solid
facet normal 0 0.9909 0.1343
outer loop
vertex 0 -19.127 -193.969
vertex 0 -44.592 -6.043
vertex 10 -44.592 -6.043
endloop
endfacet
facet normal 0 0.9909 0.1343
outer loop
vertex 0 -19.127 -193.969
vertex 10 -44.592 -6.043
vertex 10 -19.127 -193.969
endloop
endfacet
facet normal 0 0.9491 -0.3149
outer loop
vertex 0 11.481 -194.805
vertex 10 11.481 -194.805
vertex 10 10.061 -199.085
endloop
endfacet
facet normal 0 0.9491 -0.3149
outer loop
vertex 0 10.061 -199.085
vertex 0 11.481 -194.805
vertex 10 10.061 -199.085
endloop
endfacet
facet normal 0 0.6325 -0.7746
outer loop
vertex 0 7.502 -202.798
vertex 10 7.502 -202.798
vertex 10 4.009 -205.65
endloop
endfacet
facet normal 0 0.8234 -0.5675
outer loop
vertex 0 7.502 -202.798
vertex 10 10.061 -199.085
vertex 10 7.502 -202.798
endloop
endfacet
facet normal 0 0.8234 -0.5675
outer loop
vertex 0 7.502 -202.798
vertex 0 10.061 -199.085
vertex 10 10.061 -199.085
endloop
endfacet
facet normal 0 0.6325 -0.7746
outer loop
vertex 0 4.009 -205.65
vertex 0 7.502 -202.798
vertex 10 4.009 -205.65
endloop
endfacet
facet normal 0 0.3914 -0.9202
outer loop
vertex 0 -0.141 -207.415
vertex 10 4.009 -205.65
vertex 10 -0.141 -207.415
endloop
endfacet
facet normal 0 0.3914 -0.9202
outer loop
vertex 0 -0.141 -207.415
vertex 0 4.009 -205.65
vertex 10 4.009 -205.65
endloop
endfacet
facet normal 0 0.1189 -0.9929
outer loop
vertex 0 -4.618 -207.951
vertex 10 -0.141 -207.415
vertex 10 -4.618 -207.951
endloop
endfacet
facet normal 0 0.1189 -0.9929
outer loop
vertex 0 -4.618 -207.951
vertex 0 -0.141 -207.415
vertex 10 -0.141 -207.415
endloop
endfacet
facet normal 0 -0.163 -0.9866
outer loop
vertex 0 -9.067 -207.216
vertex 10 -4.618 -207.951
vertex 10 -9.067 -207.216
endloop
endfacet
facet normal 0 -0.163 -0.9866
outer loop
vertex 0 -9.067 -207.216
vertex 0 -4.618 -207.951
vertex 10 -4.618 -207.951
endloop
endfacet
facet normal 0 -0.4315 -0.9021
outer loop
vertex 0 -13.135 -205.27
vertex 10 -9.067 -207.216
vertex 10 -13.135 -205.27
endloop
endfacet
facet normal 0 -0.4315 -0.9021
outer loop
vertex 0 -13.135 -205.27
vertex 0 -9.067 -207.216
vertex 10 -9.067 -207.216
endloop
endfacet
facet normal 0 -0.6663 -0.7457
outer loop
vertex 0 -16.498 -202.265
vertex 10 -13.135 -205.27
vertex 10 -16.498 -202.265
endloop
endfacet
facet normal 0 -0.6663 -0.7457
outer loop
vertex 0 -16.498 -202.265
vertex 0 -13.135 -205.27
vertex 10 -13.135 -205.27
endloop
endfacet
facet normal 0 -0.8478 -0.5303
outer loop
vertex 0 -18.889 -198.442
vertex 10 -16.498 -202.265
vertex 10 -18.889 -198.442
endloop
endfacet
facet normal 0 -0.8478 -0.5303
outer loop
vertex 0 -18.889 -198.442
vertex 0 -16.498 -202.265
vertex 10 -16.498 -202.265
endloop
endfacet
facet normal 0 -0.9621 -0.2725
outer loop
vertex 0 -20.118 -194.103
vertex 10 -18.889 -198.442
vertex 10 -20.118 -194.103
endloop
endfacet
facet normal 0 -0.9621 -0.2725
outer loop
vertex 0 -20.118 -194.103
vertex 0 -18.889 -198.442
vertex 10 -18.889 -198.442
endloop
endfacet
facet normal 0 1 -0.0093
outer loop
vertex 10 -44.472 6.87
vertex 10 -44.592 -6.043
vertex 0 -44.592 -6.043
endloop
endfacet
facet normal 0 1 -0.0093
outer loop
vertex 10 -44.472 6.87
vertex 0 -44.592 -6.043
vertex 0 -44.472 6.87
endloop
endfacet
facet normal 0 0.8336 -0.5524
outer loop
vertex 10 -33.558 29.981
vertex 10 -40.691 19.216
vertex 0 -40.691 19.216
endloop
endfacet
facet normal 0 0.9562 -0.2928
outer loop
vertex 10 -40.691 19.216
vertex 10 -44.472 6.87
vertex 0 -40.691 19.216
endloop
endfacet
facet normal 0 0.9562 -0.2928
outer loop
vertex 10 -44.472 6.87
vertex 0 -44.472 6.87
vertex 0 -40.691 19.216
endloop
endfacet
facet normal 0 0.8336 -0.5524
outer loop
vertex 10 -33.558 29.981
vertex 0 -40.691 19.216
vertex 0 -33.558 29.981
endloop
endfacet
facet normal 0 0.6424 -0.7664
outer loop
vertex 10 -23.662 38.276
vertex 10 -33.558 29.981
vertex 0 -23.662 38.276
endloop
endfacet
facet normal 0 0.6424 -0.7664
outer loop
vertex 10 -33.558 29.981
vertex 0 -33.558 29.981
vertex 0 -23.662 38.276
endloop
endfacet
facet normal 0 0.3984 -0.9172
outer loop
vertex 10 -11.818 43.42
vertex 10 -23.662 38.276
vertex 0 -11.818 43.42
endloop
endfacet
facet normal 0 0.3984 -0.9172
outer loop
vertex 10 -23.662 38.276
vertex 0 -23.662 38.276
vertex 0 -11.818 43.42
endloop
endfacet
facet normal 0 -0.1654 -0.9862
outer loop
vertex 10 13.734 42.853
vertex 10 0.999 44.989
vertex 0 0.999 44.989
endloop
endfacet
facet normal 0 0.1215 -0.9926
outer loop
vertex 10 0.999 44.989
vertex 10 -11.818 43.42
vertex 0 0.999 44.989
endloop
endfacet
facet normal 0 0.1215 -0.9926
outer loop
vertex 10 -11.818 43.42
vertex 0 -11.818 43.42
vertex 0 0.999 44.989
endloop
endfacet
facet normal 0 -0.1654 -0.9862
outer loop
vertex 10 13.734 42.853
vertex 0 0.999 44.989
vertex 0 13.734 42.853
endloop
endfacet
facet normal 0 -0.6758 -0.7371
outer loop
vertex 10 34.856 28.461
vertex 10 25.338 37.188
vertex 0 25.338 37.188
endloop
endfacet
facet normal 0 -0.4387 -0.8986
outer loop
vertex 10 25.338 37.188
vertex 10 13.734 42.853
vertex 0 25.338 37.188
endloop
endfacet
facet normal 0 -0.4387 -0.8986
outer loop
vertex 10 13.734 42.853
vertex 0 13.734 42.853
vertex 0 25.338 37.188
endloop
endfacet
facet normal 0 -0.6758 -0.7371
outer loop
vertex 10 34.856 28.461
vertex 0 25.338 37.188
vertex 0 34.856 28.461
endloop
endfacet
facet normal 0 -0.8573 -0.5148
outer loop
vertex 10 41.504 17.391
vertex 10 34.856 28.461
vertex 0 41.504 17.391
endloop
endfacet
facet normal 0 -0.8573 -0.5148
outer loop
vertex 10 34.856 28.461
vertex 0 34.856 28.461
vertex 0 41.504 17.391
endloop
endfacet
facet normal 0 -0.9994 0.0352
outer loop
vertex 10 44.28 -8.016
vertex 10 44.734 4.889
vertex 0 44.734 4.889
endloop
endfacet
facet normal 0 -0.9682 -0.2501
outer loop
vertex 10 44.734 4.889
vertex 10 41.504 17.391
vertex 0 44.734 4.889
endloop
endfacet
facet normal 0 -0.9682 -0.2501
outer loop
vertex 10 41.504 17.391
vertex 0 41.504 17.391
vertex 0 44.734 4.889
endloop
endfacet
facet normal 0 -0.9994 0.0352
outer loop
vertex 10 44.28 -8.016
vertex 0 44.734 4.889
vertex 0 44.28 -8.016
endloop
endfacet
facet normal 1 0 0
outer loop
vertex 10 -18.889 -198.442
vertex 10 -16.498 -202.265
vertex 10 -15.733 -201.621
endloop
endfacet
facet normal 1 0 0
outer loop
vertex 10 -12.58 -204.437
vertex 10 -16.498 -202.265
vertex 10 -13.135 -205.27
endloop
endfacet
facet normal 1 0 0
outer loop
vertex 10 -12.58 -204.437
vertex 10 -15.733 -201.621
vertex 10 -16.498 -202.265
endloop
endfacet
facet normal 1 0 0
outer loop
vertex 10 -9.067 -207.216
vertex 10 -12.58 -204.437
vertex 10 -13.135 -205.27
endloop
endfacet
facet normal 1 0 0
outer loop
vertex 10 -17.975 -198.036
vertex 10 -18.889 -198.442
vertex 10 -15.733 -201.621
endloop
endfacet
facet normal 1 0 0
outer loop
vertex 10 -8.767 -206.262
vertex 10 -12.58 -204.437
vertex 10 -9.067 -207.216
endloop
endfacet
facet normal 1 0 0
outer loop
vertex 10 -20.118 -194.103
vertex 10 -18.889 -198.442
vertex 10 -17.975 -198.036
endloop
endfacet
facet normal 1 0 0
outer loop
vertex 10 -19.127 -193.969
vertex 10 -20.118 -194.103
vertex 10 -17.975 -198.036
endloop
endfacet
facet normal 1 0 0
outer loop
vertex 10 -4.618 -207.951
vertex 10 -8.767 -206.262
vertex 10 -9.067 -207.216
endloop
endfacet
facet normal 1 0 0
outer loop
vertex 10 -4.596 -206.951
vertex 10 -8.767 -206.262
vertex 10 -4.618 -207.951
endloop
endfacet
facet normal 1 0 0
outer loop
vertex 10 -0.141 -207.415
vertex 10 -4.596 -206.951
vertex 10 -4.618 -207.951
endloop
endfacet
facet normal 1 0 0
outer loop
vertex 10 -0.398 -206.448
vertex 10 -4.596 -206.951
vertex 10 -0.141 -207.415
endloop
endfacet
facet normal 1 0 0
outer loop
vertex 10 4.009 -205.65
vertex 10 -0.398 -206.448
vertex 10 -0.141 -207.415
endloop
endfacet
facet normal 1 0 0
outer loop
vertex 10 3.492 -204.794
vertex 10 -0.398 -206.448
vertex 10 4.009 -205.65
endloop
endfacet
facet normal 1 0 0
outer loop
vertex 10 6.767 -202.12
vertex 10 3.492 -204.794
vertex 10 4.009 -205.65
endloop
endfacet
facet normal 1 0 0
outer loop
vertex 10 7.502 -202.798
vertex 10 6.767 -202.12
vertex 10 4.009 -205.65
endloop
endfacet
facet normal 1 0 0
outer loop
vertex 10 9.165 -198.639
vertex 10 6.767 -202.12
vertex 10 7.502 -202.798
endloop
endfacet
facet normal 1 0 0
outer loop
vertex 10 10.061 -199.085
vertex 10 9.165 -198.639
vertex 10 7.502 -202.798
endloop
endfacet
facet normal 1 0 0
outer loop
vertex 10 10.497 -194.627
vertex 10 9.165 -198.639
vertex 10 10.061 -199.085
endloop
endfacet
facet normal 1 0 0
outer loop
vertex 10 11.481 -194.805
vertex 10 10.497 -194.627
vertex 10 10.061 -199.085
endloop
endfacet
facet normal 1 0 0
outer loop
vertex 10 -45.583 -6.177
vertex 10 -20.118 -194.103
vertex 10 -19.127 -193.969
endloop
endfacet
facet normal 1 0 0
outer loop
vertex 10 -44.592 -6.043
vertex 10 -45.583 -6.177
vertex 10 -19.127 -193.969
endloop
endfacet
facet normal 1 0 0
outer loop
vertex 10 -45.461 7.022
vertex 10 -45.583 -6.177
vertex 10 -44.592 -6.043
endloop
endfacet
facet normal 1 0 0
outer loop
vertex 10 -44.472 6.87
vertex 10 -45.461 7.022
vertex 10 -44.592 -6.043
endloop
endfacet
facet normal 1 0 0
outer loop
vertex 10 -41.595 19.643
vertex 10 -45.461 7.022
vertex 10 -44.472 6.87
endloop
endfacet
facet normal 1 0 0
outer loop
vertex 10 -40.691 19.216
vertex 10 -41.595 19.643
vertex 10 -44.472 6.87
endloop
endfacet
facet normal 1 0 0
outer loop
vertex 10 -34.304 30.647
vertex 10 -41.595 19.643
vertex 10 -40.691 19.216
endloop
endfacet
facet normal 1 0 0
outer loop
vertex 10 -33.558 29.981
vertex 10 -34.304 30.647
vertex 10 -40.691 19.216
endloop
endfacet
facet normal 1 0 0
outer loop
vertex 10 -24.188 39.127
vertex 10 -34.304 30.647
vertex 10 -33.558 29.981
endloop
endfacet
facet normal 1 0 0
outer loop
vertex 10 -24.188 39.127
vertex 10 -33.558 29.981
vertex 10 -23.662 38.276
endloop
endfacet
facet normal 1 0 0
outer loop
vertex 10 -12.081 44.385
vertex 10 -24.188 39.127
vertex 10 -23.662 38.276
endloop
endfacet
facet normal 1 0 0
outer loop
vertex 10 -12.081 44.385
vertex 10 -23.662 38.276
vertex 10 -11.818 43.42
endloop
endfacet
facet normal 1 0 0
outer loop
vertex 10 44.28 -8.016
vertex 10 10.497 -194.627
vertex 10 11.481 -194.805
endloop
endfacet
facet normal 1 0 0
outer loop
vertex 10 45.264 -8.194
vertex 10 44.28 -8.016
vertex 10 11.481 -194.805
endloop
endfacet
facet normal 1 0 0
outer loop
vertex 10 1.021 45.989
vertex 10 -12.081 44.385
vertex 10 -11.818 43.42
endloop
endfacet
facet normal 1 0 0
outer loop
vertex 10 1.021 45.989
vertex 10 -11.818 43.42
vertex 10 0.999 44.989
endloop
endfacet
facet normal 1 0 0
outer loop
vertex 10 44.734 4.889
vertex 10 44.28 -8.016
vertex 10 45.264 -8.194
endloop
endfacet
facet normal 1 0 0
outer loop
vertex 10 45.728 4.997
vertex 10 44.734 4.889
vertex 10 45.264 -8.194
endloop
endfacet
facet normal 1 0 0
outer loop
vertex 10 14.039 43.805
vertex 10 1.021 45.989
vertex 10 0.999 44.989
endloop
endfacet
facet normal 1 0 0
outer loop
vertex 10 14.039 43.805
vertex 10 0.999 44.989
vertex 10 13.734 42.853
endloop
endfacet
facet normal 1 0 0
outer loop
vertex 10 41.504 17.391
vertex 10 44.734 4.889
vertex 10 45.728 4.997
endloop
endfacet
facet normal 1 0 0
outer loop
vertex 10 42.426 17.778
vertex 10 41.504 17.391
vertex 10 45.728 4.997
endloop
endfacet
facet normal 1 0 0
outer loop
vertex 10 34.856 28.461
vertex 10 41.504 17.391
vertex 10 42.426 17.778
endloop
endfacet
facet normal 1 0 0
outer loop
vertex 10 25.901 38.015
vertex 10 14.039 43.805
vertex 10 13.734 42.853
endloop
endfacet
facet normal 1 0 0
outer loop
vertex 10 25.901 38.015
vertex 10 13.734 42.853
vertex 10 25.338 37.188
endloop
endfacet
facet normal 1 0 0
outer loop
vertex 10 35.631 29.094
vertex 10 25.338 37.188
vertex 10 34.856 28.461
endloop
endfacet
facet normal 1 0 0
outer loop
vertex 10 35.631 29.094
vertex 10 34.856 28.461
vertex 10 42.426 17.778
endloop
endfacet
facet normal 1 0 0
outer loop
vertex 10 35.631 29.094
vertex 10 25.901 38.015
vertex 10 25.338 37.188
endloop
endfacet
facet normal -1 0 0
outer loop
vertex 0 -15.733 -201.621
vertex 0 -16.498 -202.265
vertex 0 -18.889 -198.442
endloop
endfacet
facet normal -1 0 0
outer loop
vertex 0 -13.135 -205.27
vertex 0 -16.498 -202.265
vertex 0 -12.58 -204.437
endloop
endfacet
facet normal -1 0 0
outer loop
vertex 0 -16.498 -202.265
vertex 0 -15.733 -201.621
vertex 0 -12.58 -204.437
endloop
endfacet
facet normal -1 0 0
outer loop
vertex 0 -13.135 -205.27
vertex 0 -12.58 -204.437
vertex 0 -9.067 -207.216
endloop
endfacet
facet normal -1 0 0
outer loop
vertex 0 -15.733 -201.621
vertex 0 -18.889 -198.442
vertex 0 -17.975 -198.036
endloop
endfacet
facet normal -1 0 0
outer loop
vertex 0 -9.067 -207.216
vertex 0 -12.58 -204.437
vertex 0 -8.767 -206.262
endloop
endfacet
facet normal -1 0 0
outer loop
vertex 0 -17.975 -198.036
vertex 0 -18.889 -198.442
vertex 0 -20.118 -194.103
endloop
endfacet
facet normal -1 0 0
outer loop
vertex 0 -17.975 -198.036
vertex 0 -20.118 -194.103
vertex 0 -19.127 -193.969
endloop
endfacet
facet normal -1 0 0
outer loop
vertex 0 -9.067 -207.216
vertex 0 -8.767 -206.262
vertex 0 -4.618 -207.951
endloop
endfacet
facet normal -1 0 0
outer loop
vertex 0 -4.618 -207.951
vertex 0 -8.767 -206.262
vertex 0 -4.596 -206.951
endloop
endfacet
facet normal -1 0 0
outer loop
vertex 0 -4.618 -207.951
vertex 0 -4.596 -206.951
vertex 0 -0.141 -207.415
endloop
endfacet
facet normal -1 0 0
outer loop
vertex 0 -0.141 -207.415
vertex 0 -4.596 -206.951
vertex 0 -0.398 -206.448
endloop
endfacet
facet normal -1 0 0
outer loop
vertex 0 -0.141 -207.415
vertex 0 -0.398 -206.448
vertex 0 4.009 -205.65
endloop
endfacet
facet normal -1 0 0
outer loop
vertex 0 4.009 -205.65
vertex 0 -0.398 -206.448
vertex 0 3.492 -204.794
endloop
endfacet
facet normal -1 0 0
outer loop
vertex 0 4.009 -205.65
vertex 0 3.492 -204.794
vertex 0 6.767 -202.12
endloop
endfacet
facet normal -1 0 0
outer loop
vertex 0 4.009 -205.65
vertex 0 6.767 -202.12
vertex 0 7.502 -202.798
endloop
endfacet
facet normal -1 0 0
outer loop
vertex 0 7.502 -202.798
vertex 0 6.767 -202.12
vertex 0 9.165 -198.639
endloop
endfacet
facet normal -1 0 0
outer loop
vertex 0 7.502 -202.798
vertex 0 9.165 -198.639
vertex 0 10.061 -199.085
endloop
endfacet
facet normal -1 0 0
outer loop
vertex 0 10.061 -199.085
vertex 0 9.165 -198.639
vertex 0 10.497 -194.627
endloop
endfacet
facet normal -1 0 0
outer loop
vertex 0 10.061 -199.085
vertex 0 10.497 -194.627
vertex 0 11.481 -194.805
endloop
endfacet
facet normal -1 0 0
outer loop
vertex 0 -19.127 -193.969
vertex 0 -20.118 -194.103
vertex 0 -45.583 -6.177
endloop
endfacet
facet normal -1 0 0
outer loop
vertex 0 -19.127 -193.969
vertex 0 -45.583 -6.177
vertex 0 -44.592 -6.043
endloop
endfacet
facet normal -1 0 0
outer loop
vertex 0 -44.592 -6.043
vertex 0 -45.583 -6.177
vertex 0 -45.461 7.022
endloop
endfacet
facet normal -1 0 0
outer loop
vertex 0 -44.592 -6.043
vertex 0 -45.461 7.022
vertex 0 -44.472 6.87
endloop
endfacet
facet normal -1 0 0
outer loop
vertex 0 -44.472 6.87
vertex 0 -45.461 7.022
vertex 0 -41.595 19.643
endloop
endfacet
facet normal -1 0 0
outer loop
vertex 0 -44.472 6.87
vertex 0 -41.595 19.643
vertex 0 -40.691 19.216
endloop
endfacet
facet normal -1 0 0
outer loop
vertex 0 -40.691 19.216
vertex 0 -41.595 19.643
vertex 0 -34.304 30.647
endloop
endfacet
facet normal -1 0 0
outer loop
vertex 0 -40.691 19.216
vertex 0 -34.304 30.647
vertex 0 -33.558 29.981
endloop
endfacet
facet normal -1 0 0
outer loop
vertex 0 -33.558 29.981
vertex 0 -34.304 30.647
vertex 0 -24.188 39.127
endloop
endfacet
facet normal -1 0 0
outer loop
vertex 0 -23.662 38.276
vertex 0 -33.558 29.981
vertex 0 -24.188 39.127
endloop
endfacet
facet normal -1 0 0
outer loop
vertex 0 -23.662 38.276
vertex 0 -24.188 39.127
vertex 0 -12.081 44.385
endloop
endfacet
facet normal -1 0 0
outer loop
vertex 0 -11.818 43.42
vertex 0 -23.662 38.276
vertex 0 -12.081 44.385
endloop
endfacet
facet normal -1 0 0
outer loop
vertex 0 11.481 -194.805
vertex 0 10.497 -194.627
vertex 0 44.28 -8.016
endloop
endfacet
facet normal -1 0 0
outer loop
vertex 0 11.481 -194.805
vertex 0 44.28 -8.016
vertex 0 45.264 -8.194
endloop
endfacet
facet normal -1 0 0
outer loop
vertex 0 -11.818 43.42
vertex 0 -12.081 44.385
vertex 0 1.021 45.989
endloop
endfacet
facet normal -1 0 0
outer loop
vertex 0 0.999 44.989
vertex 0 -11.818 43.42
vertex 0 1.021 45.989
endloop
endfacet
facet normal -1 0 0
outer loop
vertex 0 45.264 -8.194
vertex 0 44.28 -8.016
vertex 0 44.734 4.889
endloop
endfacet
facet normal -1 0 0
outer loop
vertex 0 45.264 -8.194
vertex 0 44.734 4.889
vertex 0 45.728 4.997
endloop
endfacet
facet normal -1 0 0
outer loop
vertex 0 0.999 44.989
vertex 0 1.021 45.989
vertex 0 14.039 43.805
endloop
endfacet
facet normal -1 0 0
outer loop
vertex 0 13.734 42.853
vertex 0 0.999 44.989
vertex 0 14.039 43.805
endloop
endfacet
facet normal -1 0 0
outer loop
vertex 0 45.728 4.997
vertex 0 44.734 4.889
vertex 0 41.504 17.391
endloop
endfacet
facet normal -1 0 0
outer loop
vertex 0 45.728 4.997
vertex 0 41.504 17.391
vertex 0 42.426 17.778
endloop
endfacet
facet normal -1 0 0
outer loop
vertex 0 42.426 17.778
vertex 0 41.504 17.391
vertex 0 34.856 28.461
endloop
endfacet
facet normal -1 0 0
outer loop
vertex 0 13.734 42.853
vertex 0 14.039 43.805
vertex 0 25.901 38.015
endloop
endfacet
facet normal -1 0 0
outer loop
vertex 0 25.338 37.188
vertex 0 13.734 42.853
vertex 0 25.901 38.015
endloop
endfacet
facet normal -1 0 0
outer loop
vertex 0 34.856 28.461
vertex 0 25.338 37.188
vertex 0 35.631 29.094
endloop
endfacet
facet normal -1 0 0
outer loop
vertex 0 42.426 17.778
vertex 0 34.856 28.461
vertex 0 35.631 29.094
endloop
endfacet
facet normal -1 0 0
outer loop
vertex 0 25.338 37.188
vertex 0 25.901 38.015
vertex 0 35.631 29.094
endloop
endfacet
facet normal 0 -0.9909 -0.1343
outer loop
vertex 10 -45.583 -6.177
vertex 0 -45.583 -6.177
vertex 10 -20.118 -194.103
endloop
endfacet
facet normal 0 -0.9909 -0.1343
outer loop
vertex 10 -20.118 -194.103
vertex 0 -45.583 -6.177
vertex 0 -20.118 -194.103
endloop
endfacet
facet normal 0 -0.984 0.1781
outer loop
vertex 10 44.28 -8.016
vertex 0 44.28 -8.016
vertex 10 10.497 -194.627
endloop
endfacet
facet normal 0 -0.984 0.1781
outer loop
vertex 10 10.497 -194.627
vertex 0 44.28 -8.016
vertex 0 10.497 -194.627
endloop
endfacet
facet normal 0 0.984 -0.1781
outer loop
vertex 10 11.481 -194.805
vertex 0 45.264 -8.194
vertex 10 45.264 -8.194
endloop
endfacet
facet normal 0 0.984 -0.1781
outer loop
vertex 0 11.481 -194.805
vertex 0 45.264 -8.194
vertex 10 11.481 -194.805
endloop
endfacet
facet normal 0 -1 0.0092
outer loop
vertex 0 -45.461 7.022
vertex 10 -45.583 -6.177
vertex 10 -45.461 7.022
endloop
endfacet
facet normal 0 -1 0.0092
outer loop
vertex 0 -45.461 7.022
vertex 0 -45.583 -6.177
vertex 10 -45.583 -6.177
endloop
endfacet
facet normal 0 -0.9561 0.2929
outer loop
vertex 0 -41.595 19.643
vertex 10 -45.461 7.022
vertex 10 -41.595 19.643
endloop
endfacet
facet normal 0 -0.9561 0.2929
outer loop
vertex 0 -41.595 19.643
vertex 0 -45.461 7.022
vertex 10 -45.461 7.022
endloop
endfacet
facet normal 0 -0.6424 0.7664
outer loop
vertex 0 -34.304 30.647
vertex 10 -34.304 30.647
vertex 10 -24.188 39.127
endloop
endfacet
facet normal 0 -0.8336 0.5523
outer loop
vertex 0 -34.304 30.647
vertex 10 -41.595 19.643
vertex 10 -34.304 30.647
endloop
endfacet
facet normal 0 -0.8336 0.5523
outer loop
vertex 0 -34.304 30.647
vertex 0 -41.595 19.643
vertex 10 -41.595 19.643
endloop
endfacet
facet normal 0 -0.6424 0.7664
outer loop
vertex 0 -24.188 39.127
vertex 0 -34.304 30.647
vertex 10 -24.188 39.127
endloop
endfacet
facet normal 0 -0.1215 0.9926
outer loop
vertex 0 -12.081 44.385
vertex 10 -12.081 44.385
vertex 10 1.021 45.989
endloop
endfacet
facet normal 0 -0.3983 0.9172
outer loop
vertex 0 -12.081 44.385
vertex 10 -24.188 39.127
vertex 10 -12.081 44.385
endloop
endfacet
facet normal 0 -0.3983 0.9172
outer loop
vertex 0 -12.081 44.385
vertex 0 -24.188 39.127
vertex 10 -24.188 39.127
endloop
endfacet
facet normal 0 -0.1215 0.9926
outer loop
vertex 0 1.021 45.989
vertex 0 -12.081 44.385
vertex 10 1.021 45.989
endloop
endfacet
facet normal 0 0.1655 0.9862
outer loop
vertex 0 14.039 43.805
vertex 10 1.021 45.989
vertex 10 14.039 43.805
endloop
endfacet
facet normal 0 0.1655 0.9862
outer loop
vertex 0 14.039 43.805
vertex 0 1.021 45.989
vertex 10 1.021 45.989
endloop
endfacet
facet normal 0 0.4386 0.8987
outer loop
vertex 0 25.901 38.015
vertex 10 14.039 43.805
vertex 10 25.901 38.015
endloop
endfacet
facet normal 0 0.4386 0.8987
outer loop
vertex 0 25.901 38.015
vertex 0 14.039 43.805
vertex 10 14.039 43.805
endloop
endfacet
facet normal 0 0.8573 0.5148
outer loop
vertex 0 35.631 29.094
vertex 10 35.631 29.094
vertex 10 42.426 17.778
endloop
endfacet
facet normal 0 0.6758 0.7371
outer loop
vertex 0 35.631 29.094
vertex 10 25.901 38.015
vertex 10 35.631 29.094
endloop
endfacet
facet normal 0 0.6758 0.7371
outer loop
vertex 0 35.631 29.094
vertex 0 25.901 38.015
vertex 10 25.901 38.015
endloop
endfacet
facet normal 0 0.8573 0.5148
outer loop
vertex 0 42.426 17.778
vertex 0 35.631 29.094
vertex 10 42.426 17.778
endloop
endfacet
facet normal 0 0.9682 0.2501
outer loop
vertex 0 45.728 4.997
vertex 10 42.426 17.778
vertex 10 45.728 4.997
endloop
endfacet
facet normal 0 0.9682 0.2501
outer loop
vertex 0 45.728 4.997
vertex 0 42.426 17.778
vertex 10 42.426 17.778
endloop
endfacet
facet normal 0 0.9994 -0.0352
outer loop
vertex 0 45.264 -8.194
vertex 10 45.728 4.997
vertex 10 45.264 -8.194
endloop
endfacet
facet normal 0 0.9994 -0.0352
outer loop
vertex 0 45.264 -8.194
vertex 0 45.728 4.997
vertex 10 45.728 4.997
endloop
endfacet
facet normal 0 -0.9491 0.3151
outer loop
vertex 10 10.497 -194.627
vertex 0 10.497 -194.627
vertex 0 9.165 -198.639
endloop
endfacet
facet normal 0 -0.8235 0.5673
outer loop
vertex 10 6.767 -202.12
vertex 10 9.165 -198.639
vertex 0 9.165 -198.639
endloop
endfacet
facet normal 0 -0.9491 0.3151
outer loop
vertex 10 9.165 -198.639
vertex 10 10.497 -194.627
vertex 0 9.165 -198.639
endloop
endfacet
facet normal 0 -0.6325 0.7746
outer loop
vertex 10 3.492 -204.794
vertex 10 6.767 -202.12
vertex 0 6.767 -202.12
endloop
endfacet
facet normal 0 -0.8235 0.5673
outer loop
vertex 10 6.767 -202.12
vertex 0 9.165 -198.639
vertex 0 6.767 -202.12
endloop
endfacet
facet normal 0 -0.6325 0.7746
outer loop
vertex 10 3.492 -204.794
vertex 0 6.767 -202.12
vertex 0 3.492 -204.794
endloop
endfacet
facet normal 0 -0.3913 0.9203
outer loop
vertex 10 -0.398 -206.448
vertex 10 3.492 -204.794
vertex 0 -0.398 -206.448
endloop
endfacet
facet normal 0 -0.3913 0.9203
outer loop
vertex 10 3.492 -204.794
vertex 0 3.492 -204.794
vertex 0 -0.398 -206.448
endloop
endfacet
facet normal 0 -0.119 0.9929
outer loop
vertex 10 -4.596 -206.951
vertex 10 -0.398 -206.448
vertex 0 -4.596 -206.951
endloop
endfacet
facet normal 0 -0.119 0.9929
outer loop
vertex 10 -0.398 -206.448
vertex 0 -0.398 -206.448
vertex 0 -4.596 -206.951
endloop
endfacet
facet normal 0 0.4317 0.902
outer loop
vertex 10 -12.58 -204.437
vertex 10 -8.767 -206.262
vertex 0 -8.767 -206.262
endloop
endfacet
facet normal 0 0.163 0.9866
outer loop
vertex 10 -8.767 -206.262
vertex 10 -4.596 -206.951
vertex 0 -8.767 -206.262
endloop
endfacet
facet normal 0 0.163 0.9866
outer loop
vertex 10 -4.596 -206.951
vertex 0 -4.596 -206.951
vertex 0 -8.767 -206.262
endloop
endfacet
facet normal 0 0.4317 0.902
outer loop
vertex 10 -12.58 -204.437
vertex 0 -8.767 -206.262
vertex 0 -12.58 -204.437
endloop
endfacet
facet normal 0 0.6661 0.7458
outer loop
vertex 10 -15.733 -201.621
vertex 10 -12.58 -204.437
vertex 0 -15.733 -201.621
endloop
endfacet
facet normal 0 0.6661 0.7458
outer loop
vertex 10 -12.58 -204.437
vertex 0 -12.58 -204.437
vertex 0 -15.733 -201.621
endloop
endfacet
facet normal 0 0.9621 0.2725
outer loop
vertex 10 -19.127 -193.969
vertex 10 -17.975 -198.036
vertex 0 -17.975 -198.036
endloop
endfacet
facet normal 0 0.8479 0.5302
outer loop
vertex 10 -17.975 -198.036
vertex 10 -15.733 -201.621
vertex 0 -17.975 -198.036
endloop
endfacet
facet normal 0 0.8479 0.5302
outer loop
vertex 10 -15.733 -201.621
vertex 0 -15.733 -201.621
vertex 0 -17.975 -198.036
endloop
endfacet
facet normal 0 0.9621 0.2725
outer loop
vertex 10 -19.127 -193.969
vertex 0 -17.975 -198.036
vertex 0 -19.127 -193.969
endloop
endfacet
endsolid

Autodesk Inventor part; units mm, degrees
ref_plane "YZ Plane" through (0, 0, 0) normal (1, 0, 0) x (0, 1, 0)
ref_plane "XZ Plane" through (0, 0, 0) normal (0, 1, 0) x (-1, 0, 0)
ref_plane "XY Plane" through (0, 0, 0) normal (0, 0, 1) x (1, 0, 0)
sketch "スケッチ1" plane through (0, 0, 0) normal (1, 0, 0) x (0, 1, 0)
  arc A0 (45.2642, -8.1944) -> (-45.5834, -6.1769) centre (0, 0) ccw
  arc A1 (-20.1179, -194.1032) -> (11.4813, -194.8049) centre (-4.2628, -191.9547) ccw
  line L0 (45.2642, -8.1944) -> (11.4813, -194.8049)
  line L1 (-45.5834, -6.1769) -> (-20.1179, -194.1032)
  arc A2 (44.2802, -8.0163) -> (-44.5924, -6.0426) centre (0, 0) ccw
  arc A3 (-19.1269, -193.9689) -> (10.4973, -194.6268) centre (-4.2628, -191.9547) ccw
  line L2 (44.2802, -8.0163) -> (10.4973, -194.6268)
  line L3 (-44.5924, -6.0426) -> (-19.1269, -193.9689)
  dimension "d0" = 92
  dimension "d1" = 32
  dimension "d2" = 192.002
  dimension "d3" = 90
extrude "押し出し1" add sketch "スケッチ1" along normal blind 10
properties part number "type5" material "ゴム"
